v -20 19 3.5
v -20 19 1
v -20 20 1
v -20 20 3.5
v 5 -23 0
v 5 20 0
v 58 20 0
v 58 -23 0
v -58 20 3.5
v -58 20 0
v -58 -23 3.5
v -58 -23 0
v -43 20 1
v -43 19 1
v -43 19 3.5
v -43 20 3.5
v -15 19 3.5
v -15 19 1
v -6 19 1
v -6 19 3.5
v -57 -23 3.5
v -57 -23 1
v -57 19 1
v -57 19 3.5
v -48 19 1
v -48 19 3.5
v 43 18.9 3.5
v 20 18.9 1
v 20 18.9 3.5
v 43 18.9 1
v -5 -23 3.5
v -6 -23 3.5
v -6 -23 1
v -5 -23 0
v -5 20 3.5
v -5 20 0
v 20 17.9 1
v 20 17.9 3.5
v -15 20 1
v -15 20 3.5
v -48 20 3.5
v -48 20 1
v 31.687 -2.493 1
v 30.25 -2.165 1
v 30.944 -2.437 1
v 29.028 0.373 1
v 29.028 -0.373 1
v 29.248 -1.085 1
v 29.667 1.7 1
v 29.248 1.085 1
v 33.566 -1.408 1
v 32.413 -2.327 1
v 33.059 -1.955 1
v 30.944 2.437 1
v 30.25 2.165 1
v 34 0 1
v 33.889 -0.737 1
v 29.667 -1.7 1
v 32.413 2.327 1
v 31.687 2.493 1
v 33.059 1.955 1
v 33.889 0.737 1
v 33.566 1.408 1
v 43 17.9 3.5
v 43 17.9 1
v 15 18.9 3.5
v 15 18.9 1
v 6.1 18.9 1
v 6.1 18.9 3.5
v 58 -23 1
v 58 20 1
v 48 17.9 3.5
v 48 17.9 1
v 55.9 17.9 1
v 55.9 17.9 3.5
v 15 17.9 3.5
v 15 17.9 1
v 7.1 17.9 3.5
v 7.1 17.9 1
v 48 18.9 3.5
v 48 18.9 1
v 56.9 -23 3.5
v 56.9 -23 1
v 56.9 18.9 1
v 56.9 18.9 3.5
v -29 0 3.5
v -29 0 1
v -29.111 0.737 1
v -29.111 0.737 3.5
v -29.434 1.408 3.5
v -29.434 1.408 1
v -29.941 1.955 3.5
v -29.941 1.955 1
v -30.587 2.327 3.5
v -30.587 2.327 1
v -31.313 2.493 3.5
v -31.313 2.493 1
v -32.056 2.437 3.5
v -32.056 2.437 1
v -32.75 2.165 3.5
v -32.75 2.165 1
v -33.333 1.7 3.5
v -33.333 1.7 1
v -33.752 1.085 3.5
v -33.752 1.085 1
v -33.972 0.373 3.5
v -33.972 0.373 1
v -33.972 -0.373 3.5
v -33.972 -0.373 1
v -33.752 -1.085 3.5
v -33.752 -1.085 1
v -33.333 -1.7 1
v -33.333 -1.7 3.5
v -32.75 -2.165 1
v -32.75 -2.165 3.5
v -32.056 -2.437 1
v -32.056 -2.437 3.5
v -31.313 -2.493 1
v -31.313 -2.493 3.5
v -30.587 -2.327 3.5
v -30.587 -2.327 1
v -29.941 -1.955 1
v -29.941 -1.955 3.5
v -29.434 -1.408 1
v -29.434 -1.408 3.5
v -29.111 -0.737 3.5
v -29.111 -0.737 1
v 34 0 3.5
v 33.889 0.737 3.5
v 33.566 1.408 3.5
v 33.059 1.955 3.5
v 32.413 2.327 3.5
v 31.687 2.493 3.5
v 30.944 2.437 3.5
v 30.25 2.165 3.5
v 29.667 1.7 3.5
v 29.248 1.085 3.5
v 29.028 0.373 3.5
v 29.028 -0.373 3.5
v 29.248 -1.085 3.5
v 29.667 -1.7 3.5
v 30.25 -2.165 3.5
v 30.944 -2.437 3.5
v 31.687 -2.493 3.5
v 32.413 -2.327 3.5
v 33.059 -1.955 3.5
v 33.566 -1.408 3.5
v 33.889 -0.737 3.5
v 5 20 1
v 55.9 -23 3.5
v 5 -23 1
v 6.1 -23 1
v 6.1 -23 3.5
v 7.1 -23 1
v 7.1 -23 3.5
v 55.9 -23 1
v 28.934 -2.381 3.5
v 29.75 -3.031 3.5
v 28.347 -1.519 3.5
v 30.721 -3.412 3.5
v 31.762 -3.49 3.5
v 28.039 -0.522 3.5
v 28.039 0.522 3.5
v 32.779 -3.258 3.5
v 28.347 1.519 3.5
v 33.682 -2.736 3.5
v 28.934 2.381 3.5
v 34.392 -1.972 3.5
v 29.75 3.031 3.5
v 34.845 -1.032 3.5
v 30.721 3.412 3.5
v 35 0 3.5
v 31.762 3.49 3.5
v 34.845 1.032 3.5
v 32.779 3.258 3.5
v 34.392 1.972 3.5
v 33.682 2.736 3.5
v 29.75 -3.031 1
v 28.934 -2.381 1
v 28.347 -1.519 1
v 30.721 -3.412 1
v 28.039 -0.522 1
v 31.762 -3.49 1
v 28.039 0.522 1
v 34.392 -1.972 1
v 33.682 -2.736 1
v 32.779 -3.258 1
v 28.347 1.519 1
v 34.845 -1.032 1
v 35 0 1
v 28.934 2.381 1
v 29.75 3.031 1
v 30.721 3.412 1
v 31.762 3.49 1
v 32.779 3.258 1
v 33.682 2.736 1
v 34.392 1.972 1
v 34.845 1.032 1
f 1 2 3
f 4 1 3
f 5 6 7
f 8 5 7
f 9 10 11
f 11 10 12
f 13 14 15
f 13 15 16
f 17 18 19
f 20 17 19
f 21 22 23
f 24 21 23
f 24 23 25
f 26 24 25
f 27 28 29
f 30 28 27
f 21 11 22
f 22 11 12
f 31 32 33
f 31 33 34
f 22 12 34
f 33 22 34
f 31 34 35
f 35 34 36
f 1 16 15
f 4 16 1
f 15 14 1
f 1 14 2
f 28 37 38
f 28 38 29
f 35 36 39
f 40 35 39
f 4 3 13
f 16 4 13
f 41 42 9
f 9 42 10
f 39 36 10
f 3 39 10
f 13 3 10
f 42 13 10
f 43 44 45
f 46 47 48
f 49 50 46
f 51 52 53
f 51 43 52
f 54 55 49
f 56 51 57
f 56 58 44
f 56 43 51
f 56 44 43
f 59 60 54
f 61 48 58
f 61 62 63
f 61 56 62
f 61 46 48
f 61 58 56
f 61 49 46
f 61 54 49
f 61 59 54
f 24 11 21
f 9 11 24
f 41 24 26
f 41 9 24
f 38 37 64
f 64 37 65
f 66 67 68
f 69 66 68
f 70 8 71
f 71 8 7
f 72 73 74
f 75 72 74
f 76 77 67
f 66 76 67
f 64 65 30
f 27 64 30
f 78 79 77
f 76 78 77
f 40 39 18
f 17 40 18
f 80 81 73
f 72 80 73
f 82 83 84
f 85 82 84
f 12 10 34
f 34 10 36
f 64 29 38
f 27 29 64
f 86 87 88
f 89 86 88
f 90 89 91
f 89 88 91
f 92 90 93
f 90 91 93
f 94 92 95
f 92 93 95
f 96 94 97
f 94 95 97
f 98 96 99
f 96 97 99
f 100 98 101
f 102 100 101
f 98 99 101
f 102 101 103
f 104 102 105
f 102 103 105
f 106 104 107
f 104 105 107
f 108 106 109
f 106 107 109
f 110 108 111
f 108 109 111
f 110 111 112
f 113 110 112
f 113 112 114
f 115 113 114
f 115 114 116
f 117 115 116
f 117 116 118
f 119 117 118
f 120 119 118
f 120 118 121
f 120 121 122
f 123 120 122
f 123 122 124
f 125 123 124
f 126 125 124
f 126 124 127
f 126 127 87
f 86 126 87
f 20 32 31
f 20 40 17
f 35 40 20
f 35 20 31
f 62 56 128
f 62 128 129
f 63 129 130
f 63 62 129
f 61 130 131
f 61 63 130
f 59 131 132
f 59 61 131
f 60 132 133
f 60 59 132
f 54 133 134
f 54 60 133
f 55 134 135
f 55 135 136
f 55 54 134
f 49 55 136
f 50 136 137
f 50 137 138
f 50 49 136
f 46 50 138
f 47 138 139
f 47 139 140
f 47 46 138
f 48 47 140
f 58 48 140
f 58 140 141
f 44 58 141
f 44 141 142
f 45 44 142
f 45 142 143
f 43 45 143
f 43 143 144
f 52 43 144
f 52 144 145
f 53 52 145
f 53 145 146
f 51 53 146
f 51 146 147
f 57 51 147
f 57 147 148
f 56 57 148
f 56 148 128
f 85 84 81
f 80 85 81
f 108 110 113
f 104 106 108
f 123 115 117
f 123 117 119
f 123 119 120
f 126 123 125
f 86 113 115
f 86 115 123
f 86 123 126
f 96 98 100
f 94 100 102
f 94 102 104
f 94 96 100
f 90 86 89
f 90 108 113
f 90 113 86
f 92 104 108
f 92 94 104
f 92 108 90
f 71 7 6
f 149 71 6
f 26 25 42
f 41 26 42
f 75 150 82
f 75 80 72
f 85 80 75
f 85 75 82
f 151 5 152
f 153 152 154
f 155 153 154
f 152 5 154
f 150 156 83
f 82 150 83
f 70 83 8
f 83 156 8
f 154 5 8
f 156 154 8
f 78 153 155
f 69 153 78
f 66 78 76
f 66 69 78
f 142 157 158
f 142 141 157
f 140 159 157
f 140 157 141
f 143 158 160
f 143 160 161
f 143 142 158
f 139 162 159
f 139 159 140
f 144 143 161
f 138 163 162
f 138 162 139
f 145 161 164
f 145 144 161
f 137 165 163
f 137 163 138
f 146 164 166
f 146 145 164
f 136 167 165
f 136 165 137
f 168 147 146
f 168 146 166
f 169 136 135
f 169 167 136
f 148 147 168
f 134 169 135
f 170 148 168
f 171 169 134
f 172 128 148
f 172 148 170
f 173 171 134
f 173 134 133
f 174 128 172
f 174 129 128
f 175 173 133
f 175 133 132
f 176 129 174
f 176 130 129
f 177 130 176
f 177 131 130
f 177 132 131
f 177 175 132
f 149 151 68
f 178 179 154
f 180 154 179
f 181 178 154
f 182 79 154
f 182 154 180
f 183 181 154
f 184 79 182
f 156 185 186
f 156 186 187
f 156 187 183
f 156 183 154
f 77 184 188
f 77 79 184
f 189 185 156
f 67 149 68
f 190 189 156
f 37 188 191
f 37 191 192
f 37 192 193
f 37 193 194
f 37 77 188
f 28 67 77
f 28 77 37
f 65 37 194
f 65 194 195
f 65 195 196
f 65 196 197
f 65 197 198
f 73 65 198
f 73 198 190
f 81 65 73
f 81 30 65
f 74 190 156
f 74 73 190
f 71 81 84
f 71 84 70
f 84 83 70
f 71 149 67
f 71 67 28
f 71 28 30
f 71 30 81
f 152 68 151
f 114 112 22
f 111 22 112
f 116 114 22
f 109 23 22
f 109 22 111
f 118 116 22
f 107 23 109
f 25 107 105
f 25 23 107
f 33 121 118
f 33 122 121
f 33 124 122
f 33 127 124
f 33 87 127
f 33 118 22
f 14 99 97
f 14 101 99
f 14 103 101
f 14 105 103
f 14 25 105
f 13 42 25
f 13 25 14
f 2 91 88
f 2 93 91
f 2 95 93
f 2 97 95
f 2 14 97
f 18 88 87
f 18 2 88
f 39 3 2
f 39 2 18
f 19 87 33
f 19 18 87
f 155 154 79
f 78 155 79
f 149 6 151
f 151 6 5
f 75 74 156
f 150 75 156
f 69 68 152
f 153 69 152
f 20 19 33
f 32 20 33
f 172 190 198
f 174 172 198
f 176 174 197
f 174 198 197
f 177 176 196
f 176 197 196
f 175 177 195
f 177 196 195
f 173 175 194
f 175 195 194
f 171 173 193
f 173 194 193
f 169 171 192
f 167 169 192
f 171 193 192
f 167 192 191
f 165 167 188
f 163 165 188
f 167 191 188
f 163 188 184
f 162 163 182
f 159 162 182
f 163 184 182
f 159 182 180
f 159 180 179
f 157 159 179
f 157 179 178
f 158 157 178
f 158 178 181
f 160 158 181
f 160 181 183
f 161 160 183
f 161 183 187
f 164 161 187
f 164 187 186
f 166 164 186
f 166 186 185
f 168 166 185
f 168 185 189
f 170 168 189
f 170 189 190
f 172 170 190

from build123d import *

# Parameters (mm, degrees)
F0_R     = 2.5
F0_W     = 5
F0_H     = 1
F1_DEPTH = 1
F0_W_2   = 23
F2_DEPTH = 3.5
F3_DEPTH = 3.5
F4_R     = 3.5
F4_R_2   = 2.5
F4_W     = 23
F4_H     = 1.1
F4_W_2   = 5
F4_H_2   = 1
F5_DEPTH = 1
F6_DEPTH = 3.5
F7_DEPTH = 3.5


with BuildPart() as f1:
    # F0 (on Top) → F1 (new body)
    with BuildSketch(Plane.XY):
        Polygon((-57, 19), (-57, -23), (-6, -23), (-6, 19), (-15, 19), (-20, 19), (-43, 19), (-48, 19), align=None)
        with Locations((-31.5, 0)):
            Circle(F0_R, mode=Mode.SUBTRACT)
        with Locations((-17.5, 19.5)):
            Rectangle(F0_W, F0_H)
        with Locations((-45.5, 19.5)):
            Rectangle(F0_W, F0_H)
    extrude(amount=F1_DEPTH)

    # F0 (on Top) → F2 (join)
    with BuildSketch(Plane.XY):
        Polygon((-58, 20), (-58, -23), (-57, -23), (-57, 19), (-48, 19), (-48, 20), align=None)
        with Locations((-31.5, 19.5)):
            Rectangle(F0_W_2, F0_H)
        Polygon((-6, 19), (-6, -23), (-5, -23), (-5, 20), (-15, 20), (-15, 19), align=None)
    extrude(amount=F2_DEPTH)

    # F0 (on Top) → F3 (join)
    with BuildSketch(Plane.XY):
        with Locations((-31.5, 0)):
            Circle(F0_R)
    extrude(amount=F3_DEPTH)


with BuildPart() as f5:
    # F4 (on Top) → F5 (new body)
    with BuildSketch(Plane.XY):
        Polygon((7.1, 17.9), (7.1, -23), (55.9, -23), (55.9, 17.9), (48, 17.9), (43, 17.9), (20, 17.9), (15, 17.9), align=None)
        with Locations((31.5, 0)):
            Circle(F4_R, mode=Mode.SUBTRACT)
        Polygon((5, 20), (5, -23), (6.1, -23), (6.1, 18.9), (15, 18.9), (15, 20), align=None)
        Polygon((56.9, 18.9), (56.9, -23), (58, -23), (58, 20), (48, 20), (48, 18.9), align=None)
        with Locations((31.5, 0)):
            Circle(F4_R)
        with Locations((31.5, 0)):
            Circle(F4_R_2, mode=Mode.SUBTRACT)
        with Locations((31.5, 19.45)):
            Rectangle(F4_W, F4_H)
        with Locations((31.5, 0)):
            Circle(F4_R_2)
        with Locations((17.5, 19.45)):
            Rectangle(F4_W_2, F4_H)
        with Locations((45.5, 19.45)):
            Rectangle(F4_W_2, F4_H)
        with Locations((17.5, 18.4)):
            Rectangle(F4_W_2, F4_H_2)
        with Locations((45.5, 18.4)):
            Rectangle(F4_W_2, F4_H_2)
    extrude(amount=F5_DEPTH)

    # F4 (on Top) → F6 (join)
    with BuildSketch(Plane.XY):
        Polygon((6.1, 18.9), (6.1, -23), (7.1, -23), (7.1, 17.9), (15, 17.9), (15, 18.9), align=None)
        with Locations((31.5, 18.4)):
            Rectangle(F4_W, F4_H_2)
        Polygon((55.9, 17.9), (55.9, -23), (56.9, -23), (56.9, 18.9), (48, 18.9), (48, 17.9), align=None)
    extrude(amount=F6_DEPTH)

    # F4 (on Top) → F7 (join)
    with BuildSketch(Plane.XY):
        with Locations((31.5, 0)):
            Circle(F4_R)
        with Locations((31.5, 0)):
            Circle(F4_R_2, mode=Mode.SUBTRACT)
    extrude(amount=F7_DEPTH)


solid = Compound([f1.part, f5.part])
